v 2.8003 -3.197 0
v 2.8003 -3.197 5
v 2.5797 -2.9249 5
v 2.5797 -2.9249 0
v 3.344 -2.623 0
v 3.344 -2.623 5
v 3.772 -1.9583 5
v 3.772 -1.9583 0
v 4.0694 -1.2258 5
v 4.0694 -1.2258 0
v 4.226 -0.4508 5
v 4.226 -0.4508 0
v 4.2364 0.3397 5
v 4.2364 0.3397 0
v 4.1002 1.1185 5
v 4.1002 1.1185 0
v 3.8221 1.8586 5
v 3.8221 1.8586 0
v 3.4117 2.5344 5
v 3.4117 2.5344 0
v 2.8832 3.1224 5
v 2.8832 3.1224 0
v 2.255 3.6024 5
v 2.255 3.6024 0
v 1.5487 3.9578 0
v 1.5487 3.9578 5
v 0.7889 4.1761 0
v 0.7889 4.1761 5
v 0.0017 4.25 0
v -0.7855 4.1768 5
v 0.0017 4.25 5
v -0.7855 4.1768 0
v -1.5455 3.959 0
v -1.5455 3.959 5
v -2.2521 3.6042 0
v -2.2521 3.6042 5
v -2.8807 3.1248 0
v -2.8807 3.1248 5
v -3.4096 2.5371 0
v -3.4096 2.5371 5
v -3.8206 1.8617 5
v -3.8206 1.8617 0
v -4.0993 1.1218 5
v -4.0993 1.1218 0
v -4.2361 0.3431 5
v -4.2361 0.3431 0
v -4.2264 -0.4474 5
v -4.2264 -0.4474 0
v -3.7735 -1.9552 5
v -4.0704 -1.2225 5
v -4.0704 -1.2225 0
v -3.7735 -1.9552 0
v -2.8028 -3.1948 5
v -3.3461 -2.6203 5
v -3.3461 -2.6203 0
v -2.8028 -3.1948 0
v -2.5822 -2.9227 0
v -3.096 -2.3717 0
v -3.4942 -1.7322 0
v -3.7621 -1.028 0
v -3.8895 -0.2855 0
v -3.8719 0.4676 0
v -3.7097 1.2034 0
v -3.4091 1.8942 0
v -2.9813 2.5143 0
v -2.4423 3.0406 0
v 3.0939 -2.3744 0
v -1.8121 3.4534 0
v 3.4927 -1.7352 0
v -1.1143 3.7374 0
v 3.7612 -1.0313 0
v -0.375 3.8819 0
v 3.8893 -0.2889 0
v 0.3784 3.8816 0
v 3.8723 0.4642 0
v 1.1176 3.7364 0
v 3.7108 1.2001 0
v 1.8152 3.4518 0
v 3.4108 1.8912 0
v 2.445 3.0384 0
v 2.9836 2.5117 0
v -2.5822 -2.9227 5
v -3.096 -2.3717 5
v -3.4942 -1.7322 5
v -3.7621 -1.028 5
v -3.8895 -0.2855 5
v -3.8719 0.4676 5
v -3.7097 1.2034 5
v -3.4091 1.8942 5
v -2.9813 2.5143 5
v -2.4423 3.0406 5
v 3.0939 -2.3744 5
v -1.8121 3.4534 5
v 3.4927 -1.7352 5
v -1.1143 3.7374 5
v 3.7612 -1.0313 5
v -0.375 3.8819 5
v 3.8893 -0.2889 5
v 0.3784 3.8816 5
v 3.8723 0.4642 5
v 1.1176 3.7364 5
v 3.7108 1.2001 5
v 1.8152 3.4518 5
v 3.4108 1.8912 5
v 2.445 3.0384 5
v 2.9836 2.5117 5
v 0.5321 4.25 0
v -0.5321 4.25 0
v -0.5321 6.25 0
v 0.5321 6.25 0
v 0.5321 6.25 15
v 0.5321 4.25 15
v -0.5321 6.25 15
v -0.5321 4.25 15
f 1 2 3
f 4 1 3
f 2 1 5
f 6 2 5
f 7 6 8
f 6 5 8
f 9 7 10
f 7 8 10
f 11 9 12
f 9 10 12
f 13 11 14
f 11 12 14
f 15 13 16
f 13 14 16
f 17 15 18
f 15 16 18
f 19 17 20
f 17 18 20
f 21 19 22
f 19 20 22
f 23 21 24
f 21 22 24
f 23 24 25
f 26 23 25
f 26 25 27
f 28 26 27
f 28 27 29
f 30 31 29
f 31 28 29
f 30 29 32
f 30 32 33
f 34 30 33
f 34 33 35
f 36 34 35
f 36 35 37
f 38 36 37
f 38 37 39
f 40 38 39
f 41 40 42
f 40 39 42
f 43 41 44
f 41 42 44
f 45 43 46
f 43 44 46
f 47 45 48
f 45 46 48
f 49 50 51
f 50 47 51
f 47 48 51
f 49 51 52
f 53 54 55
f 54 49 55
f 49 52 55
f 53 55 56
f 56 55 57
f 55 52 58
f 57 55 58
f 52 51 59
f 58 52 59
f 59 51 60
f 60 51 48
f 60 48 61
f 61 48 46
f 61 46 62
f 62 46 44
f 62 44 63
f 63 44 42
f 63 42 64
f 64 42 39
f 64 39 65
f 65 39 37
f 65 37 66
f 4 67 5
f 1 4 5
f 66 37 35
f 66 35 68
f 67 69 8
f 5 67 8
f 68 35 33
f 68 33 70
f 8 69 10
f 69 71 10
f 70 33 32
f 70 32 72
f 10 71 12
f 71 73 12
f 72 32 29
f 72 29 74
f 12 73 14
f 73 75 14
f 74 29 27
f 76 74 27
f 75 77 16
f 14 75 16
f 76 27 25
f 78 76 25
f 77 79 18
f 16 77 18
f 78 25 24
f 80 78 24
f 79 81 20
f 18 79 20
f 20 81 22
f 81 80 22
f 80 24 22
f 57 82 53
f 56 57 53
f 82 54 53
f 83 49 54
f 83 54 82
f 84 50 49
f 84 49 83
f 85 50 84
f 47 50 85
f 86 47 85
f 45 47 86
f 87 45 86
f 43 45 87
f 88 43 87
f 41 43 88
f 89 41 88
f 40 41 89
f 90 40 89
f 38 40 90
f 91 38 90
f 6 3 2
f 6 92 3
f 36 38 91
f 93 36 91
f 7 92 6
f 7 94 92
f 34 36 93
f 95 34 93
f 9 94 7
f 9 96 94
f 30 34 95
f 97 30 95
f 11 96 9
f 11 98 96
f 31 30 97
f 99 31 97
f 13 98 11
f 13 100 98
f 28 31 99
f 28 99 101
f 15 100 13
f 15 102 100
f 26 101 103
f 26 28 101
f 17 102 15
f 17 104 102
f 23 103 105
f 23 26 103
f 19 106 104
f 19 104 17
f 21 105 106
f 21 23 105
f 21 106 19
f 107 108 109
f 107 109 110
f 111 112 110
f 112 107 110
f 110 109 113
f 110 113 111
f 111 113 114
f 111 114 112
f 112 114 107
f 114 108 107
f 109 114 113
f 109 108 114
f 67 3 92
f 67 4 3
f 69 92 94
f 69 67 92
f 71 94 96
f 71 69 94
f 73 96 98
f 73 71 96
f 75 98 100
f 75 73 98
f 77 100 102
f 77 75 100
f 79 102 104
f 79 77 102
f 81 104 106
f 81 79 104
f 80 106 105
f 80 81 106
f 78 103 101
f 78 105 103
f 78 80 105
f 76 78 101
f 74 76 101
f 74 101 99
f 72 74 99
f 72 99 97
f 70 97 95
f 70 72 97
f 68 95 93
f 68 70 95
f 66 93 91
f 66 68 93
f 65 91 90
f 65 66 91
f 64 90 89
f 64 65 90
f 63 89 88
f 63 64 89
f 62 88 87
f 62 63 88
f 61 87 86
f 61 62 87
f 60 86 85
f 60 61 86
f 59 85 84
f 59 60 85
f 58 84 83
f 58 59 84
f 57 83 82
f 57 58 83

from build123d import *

# Parameters (mm, degrees)
SKETCH1_R           = 4.25
SKETCH1_R_2         = 3.9
BOSS_EXTRUDE1_DEPTH = 5
CUT_EXTRUDE4_DEPTH  = 5
SKETCH3_W           = 1.064141482
SKETCH3_H           = 5
BOSS_EXTRUDE2_DEPTH = 2
SKETCH4_W           = 1.064141482
SKETCH4_H           = 2
BOSS_EXTRUDE3_DEPTH = 10


with BuildPart() as part:
    # Sketch1 → Boss-Extrude1 (new body)
    with BuildSketch(Plane.XY):
        Circle(SKETCH1_R)
        Circle(SKETCH1_R_2, mode=Mode.SUBTRACT)
    extrude(amount=BOSS_EXTRUDE1_DEPTH)

    # Sketch2 → Cut-Extrude4 (cut)
    with BuildSketch(Plane.XY.offset(5)):
        with BuildLine():
            Line((-0.002204063, 0.259753333), (-3.852557283, -4.489569771))
            ThreePointArc((-3.852557283, -4.489569771), (-2.297684013, -6.180995378), (-0.002204063, -6.277552461))
            ThreePointArc((-0.002204063, -6.277552461), (2.293275887, -6.180995378), (3.848149157, -4.489569771))
            Line((3.848149157, -4.489569771), (-0.002204063, 0.259753333))
        make_face()
    extrude(amount=-CUT_EXTRUDE4_DEPTH, mode=Mode.SUBTRACT)


with BuildPart() as body_2:
    # Sketch3 → Boss-Extrude2 (new body)
    with BuildSketch(Plane(origin=(0, 4.25, 0), x_dir=(1, 0, 0), z_dir=(0, 1, 0))):
        with Locations((0, -2.5)):
            Rectangle(SKETCH3_W, SKETCH3_H)
    extrude(amount=BOSS_EXTRUDE2_DEPTH)

    # Sketch4 → Boss-Extrude3 (add)
    with BuildSketch(Plane.XY.offset(5)):
        with Locations((0, 5.25)):
            Rectangle(SKETCH4_W, SKETCH4_H)
    extrude(amount=BOSS_EXTRUDE3_DEPTH)


solid = Compound([part.part, body_2.part])
